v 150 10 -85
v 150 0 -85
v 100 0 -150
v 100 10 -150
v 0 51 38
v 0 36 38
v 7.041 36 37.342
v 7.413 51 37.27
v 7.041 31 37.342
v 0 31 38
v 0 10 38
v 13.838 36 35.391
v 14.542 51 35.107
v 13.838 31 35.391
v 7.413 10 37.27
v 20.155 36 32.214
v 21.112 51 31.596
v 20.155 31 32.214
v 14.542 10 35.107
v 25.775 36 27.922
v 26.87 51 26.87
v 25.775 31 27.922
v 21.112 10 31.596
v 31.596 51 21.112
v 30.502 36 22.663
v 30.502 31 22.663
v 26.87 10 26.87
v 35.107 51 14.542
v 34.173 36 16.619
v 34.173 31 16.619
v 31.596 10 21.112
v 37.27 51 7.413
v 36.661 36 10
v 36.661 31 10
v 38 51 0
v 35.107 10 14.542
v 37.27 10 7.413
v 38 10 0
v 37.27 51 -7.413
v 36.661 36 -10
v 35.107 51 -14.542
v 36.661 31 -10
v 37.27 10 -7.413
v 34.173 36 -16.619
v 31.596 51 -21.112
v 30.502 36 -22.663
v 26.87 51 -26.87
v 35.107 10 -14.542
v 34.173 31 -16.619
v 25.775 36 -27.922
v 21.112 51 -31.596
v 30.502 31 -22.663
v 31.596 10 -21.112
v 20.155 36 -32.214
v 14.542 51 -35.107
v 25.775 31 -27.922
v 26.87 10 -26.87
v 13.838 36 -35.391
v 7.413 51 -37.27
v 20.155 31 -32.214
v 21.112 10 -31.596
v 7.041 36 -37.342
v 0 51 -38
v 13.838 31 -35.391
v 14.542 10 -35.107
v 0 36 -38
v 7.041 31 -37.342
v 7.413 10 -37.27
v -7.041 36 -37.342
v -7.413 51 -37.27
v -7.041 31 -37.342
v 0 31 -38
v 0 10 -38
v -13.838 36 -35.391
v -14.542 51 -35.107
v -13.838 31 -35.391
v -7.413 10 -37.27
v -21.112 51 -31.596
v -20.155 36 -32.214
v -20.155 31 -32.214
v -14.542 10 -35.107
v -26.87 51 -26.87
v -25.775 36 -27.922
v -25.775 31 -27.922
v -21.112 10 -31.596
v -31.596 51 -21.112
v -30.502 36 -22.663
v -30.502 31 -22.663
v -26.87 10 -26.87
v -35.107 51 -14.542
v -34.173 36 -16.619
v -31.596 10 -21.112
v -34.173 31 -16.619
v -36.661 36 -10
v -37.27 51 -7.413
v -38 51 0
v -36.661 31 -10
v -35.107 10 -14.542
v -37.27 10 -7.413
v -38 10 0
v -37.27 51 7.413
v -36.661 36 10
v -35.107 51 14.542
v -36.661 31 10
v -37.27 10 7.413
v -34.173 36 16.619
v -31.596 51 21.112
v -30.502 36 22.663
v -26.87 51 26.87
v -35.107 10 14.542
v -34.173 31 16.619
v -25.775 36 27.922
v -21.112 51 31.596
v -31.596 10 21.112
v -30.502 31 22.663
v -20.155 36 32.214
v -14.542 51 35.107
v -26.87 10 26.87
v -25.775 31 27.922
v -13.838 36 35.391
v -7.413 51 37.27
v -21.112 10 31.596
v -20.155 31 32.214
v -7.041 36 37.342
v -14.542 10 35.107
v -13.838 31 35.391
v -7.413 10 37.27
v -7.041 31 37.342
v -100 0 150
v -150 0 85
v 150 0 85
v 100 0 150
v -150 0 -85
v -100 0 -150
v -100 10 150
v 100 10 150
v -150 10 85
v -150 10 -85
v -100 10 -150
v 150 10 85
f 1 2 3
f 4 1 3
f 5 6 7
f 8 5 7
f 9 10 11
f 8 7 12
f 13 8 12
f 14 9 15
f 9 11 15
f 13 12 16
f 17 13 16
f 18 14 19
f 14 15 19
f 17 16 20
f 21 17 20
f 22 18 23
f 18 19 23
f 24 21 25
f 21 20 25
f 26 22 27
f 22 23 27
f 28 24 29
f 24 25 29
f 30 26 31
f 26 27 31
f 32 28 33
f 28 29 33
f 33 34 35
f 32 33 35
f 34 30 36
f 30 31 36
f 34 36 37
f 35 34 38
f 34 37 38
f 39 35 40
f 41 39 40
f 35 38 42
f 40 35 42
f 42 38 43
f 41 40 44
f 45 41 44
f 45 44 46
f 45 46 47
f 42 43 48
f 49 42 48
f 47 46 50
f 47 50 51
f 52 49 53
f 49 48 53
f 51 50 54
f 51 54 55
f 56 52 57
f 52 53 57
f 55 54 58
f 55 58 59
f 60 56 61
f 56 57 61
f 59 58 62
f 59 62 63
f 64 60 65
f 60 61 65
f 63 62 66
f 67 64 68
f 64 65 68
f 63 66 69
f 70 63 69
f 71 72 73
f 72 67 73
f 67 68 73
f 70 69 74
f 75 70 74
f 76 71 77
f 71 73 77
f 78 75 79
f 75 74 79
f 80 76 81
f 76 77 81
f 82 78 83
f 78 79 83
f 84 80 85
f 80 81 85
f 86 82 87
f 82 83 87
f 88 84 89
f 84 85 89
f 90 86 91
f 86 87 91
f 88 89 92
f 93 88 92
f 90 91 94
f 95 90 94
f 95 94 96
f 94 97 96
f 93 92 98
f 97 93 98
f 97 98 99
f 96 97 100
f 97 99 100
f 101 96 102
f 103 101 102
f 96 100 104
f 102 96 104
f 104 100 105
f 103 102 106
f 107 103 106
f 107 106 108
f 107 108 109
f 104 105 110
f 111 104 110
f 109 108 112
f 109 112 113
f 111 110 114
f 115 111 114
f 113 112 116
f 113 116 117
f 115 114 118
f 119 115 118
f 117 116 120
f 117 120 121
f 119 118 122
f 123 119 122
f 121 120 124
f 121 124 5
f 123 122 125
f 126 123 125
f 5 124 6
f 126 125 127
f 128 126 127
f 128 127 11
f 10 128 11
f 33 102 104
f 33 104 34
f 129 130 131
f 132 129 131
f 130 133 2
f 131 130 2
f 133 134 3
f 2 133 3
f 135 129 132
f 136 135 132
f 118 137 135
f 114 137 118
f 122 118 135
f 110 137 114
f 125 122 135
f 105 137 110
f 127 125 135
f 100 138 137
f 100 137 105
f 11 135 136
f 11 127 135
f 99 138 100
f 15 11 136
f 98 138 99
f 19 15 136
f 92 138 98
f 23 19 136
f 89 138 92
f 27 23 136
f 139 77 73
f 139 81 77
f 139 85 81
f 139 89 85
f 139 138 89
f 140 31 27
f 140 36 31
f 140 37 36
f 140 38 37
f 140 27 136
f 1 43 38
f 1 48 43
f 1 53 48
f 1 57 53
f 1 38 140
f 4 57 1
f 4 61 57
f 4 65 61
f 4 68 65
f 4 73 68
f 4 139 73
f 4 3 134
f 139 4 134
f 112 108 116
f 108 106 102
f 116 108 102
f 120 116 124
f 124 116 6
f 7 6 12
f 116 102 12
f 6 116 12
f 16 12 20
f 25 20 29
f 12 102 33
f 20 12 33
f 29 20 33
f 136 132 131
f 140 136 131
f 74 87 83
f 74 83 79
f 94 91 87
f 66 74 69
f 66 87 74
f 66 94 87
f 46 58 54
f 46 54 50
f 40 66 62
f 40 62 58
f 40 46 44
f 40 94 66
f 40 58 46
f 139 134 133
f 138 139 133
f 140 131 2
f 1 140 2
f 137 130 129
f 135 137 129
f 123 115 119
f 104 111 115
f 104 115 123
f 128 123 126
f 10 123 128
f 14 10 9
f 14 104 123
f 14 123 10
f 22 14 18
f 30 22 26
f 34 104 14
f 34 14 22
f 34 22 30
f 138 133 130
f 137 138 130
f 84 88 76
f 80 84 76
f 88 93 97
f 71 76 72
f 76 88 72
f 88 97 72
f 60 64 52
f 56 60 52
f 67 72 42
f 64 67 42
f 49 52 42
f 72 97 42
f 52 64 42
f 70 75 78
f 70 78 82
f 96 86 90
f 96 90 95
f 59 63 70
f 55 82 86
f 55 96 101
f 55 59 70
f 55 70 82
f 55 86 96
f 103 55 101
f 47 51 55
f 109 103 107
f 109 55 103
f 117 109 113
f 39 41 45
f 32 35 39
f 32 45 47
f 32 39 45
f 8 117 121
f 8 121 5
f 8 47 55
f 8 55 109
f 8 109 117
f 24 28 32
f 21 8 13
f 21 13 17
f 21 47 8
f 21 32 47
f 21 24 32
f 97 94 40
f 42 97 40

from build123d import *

# Parameters (mm, degrees)
BOSS_EXTRUDE1_DEPTH = 10
SKETCH2_R           = 38
BOSS_EXTRUDE2_DEPTH = 41
CUT_EXTRUDE1_START  = 10
SKETCH3_W           = 76
SKETCH3_H           = 5
CUT_EXTRUDE1_DEPTH  = 50
CUT_EXTRUDE2_START  = -10
SKETCH4_W           = 76
SKETCH4_H           = 5
CUT_EXTRUDE2_DEPTH  = 41


with BuildPart() as part:
    # Sketch1 → Boss-Extrude1 (new body)
    with BuildSketch(Plane(origin=(0, 0, 0), x_dir=(1, 0, 0), z_dir=(0, 1, 0))):
        Polygon((-100, 150), (-150, 85), (-150, -85), (-100, -150), (100, -150), (150, -85), (150, 85), (100, 150), align=None)
    extrude(amount=BOSS_EXTRUDE1_DEPTH)

    # Sketch2 → Boss-Extrude2 (add)
    with BuildSketch(Plane(origin=(0, 10, 0), x_dir=(1, 0, 0), z_dir=(0, 1, 0))):
        with Locations(Location((0, 0, 0), (0, 0, 270))):
            Circle(SKETCH2_R)
    extrude(amount=BOSS_EXTRUDE2_DEPTH)

    # Sketch3 → Cut-Extrude1 (cut)
    with BuildSketch(Plane.XY.offset(CUT_EXTRUDE1_START)):
        with Locations((0, 33.5)):
            Rectangle(SKETCH3_W, SKETCH3_H)
    extrude(amount=CUT_EXTRUDE1_DEPTH, mode=Mode.SUBTRACT)

    # Sketch4 → Cut-Extrude2 (cut)
    with BuildSketch(Plane.XY.offset(CUT_EXTRUDE2_START)):
        with Locations((0, 33.5)):
            Rectangle(SKETCH4_W, SKETCH4_H)
    extrude(amount=-CUT_EXTRUDE2_DEPTH, mode=Mode.SUBTRACT)


solid = part.part
